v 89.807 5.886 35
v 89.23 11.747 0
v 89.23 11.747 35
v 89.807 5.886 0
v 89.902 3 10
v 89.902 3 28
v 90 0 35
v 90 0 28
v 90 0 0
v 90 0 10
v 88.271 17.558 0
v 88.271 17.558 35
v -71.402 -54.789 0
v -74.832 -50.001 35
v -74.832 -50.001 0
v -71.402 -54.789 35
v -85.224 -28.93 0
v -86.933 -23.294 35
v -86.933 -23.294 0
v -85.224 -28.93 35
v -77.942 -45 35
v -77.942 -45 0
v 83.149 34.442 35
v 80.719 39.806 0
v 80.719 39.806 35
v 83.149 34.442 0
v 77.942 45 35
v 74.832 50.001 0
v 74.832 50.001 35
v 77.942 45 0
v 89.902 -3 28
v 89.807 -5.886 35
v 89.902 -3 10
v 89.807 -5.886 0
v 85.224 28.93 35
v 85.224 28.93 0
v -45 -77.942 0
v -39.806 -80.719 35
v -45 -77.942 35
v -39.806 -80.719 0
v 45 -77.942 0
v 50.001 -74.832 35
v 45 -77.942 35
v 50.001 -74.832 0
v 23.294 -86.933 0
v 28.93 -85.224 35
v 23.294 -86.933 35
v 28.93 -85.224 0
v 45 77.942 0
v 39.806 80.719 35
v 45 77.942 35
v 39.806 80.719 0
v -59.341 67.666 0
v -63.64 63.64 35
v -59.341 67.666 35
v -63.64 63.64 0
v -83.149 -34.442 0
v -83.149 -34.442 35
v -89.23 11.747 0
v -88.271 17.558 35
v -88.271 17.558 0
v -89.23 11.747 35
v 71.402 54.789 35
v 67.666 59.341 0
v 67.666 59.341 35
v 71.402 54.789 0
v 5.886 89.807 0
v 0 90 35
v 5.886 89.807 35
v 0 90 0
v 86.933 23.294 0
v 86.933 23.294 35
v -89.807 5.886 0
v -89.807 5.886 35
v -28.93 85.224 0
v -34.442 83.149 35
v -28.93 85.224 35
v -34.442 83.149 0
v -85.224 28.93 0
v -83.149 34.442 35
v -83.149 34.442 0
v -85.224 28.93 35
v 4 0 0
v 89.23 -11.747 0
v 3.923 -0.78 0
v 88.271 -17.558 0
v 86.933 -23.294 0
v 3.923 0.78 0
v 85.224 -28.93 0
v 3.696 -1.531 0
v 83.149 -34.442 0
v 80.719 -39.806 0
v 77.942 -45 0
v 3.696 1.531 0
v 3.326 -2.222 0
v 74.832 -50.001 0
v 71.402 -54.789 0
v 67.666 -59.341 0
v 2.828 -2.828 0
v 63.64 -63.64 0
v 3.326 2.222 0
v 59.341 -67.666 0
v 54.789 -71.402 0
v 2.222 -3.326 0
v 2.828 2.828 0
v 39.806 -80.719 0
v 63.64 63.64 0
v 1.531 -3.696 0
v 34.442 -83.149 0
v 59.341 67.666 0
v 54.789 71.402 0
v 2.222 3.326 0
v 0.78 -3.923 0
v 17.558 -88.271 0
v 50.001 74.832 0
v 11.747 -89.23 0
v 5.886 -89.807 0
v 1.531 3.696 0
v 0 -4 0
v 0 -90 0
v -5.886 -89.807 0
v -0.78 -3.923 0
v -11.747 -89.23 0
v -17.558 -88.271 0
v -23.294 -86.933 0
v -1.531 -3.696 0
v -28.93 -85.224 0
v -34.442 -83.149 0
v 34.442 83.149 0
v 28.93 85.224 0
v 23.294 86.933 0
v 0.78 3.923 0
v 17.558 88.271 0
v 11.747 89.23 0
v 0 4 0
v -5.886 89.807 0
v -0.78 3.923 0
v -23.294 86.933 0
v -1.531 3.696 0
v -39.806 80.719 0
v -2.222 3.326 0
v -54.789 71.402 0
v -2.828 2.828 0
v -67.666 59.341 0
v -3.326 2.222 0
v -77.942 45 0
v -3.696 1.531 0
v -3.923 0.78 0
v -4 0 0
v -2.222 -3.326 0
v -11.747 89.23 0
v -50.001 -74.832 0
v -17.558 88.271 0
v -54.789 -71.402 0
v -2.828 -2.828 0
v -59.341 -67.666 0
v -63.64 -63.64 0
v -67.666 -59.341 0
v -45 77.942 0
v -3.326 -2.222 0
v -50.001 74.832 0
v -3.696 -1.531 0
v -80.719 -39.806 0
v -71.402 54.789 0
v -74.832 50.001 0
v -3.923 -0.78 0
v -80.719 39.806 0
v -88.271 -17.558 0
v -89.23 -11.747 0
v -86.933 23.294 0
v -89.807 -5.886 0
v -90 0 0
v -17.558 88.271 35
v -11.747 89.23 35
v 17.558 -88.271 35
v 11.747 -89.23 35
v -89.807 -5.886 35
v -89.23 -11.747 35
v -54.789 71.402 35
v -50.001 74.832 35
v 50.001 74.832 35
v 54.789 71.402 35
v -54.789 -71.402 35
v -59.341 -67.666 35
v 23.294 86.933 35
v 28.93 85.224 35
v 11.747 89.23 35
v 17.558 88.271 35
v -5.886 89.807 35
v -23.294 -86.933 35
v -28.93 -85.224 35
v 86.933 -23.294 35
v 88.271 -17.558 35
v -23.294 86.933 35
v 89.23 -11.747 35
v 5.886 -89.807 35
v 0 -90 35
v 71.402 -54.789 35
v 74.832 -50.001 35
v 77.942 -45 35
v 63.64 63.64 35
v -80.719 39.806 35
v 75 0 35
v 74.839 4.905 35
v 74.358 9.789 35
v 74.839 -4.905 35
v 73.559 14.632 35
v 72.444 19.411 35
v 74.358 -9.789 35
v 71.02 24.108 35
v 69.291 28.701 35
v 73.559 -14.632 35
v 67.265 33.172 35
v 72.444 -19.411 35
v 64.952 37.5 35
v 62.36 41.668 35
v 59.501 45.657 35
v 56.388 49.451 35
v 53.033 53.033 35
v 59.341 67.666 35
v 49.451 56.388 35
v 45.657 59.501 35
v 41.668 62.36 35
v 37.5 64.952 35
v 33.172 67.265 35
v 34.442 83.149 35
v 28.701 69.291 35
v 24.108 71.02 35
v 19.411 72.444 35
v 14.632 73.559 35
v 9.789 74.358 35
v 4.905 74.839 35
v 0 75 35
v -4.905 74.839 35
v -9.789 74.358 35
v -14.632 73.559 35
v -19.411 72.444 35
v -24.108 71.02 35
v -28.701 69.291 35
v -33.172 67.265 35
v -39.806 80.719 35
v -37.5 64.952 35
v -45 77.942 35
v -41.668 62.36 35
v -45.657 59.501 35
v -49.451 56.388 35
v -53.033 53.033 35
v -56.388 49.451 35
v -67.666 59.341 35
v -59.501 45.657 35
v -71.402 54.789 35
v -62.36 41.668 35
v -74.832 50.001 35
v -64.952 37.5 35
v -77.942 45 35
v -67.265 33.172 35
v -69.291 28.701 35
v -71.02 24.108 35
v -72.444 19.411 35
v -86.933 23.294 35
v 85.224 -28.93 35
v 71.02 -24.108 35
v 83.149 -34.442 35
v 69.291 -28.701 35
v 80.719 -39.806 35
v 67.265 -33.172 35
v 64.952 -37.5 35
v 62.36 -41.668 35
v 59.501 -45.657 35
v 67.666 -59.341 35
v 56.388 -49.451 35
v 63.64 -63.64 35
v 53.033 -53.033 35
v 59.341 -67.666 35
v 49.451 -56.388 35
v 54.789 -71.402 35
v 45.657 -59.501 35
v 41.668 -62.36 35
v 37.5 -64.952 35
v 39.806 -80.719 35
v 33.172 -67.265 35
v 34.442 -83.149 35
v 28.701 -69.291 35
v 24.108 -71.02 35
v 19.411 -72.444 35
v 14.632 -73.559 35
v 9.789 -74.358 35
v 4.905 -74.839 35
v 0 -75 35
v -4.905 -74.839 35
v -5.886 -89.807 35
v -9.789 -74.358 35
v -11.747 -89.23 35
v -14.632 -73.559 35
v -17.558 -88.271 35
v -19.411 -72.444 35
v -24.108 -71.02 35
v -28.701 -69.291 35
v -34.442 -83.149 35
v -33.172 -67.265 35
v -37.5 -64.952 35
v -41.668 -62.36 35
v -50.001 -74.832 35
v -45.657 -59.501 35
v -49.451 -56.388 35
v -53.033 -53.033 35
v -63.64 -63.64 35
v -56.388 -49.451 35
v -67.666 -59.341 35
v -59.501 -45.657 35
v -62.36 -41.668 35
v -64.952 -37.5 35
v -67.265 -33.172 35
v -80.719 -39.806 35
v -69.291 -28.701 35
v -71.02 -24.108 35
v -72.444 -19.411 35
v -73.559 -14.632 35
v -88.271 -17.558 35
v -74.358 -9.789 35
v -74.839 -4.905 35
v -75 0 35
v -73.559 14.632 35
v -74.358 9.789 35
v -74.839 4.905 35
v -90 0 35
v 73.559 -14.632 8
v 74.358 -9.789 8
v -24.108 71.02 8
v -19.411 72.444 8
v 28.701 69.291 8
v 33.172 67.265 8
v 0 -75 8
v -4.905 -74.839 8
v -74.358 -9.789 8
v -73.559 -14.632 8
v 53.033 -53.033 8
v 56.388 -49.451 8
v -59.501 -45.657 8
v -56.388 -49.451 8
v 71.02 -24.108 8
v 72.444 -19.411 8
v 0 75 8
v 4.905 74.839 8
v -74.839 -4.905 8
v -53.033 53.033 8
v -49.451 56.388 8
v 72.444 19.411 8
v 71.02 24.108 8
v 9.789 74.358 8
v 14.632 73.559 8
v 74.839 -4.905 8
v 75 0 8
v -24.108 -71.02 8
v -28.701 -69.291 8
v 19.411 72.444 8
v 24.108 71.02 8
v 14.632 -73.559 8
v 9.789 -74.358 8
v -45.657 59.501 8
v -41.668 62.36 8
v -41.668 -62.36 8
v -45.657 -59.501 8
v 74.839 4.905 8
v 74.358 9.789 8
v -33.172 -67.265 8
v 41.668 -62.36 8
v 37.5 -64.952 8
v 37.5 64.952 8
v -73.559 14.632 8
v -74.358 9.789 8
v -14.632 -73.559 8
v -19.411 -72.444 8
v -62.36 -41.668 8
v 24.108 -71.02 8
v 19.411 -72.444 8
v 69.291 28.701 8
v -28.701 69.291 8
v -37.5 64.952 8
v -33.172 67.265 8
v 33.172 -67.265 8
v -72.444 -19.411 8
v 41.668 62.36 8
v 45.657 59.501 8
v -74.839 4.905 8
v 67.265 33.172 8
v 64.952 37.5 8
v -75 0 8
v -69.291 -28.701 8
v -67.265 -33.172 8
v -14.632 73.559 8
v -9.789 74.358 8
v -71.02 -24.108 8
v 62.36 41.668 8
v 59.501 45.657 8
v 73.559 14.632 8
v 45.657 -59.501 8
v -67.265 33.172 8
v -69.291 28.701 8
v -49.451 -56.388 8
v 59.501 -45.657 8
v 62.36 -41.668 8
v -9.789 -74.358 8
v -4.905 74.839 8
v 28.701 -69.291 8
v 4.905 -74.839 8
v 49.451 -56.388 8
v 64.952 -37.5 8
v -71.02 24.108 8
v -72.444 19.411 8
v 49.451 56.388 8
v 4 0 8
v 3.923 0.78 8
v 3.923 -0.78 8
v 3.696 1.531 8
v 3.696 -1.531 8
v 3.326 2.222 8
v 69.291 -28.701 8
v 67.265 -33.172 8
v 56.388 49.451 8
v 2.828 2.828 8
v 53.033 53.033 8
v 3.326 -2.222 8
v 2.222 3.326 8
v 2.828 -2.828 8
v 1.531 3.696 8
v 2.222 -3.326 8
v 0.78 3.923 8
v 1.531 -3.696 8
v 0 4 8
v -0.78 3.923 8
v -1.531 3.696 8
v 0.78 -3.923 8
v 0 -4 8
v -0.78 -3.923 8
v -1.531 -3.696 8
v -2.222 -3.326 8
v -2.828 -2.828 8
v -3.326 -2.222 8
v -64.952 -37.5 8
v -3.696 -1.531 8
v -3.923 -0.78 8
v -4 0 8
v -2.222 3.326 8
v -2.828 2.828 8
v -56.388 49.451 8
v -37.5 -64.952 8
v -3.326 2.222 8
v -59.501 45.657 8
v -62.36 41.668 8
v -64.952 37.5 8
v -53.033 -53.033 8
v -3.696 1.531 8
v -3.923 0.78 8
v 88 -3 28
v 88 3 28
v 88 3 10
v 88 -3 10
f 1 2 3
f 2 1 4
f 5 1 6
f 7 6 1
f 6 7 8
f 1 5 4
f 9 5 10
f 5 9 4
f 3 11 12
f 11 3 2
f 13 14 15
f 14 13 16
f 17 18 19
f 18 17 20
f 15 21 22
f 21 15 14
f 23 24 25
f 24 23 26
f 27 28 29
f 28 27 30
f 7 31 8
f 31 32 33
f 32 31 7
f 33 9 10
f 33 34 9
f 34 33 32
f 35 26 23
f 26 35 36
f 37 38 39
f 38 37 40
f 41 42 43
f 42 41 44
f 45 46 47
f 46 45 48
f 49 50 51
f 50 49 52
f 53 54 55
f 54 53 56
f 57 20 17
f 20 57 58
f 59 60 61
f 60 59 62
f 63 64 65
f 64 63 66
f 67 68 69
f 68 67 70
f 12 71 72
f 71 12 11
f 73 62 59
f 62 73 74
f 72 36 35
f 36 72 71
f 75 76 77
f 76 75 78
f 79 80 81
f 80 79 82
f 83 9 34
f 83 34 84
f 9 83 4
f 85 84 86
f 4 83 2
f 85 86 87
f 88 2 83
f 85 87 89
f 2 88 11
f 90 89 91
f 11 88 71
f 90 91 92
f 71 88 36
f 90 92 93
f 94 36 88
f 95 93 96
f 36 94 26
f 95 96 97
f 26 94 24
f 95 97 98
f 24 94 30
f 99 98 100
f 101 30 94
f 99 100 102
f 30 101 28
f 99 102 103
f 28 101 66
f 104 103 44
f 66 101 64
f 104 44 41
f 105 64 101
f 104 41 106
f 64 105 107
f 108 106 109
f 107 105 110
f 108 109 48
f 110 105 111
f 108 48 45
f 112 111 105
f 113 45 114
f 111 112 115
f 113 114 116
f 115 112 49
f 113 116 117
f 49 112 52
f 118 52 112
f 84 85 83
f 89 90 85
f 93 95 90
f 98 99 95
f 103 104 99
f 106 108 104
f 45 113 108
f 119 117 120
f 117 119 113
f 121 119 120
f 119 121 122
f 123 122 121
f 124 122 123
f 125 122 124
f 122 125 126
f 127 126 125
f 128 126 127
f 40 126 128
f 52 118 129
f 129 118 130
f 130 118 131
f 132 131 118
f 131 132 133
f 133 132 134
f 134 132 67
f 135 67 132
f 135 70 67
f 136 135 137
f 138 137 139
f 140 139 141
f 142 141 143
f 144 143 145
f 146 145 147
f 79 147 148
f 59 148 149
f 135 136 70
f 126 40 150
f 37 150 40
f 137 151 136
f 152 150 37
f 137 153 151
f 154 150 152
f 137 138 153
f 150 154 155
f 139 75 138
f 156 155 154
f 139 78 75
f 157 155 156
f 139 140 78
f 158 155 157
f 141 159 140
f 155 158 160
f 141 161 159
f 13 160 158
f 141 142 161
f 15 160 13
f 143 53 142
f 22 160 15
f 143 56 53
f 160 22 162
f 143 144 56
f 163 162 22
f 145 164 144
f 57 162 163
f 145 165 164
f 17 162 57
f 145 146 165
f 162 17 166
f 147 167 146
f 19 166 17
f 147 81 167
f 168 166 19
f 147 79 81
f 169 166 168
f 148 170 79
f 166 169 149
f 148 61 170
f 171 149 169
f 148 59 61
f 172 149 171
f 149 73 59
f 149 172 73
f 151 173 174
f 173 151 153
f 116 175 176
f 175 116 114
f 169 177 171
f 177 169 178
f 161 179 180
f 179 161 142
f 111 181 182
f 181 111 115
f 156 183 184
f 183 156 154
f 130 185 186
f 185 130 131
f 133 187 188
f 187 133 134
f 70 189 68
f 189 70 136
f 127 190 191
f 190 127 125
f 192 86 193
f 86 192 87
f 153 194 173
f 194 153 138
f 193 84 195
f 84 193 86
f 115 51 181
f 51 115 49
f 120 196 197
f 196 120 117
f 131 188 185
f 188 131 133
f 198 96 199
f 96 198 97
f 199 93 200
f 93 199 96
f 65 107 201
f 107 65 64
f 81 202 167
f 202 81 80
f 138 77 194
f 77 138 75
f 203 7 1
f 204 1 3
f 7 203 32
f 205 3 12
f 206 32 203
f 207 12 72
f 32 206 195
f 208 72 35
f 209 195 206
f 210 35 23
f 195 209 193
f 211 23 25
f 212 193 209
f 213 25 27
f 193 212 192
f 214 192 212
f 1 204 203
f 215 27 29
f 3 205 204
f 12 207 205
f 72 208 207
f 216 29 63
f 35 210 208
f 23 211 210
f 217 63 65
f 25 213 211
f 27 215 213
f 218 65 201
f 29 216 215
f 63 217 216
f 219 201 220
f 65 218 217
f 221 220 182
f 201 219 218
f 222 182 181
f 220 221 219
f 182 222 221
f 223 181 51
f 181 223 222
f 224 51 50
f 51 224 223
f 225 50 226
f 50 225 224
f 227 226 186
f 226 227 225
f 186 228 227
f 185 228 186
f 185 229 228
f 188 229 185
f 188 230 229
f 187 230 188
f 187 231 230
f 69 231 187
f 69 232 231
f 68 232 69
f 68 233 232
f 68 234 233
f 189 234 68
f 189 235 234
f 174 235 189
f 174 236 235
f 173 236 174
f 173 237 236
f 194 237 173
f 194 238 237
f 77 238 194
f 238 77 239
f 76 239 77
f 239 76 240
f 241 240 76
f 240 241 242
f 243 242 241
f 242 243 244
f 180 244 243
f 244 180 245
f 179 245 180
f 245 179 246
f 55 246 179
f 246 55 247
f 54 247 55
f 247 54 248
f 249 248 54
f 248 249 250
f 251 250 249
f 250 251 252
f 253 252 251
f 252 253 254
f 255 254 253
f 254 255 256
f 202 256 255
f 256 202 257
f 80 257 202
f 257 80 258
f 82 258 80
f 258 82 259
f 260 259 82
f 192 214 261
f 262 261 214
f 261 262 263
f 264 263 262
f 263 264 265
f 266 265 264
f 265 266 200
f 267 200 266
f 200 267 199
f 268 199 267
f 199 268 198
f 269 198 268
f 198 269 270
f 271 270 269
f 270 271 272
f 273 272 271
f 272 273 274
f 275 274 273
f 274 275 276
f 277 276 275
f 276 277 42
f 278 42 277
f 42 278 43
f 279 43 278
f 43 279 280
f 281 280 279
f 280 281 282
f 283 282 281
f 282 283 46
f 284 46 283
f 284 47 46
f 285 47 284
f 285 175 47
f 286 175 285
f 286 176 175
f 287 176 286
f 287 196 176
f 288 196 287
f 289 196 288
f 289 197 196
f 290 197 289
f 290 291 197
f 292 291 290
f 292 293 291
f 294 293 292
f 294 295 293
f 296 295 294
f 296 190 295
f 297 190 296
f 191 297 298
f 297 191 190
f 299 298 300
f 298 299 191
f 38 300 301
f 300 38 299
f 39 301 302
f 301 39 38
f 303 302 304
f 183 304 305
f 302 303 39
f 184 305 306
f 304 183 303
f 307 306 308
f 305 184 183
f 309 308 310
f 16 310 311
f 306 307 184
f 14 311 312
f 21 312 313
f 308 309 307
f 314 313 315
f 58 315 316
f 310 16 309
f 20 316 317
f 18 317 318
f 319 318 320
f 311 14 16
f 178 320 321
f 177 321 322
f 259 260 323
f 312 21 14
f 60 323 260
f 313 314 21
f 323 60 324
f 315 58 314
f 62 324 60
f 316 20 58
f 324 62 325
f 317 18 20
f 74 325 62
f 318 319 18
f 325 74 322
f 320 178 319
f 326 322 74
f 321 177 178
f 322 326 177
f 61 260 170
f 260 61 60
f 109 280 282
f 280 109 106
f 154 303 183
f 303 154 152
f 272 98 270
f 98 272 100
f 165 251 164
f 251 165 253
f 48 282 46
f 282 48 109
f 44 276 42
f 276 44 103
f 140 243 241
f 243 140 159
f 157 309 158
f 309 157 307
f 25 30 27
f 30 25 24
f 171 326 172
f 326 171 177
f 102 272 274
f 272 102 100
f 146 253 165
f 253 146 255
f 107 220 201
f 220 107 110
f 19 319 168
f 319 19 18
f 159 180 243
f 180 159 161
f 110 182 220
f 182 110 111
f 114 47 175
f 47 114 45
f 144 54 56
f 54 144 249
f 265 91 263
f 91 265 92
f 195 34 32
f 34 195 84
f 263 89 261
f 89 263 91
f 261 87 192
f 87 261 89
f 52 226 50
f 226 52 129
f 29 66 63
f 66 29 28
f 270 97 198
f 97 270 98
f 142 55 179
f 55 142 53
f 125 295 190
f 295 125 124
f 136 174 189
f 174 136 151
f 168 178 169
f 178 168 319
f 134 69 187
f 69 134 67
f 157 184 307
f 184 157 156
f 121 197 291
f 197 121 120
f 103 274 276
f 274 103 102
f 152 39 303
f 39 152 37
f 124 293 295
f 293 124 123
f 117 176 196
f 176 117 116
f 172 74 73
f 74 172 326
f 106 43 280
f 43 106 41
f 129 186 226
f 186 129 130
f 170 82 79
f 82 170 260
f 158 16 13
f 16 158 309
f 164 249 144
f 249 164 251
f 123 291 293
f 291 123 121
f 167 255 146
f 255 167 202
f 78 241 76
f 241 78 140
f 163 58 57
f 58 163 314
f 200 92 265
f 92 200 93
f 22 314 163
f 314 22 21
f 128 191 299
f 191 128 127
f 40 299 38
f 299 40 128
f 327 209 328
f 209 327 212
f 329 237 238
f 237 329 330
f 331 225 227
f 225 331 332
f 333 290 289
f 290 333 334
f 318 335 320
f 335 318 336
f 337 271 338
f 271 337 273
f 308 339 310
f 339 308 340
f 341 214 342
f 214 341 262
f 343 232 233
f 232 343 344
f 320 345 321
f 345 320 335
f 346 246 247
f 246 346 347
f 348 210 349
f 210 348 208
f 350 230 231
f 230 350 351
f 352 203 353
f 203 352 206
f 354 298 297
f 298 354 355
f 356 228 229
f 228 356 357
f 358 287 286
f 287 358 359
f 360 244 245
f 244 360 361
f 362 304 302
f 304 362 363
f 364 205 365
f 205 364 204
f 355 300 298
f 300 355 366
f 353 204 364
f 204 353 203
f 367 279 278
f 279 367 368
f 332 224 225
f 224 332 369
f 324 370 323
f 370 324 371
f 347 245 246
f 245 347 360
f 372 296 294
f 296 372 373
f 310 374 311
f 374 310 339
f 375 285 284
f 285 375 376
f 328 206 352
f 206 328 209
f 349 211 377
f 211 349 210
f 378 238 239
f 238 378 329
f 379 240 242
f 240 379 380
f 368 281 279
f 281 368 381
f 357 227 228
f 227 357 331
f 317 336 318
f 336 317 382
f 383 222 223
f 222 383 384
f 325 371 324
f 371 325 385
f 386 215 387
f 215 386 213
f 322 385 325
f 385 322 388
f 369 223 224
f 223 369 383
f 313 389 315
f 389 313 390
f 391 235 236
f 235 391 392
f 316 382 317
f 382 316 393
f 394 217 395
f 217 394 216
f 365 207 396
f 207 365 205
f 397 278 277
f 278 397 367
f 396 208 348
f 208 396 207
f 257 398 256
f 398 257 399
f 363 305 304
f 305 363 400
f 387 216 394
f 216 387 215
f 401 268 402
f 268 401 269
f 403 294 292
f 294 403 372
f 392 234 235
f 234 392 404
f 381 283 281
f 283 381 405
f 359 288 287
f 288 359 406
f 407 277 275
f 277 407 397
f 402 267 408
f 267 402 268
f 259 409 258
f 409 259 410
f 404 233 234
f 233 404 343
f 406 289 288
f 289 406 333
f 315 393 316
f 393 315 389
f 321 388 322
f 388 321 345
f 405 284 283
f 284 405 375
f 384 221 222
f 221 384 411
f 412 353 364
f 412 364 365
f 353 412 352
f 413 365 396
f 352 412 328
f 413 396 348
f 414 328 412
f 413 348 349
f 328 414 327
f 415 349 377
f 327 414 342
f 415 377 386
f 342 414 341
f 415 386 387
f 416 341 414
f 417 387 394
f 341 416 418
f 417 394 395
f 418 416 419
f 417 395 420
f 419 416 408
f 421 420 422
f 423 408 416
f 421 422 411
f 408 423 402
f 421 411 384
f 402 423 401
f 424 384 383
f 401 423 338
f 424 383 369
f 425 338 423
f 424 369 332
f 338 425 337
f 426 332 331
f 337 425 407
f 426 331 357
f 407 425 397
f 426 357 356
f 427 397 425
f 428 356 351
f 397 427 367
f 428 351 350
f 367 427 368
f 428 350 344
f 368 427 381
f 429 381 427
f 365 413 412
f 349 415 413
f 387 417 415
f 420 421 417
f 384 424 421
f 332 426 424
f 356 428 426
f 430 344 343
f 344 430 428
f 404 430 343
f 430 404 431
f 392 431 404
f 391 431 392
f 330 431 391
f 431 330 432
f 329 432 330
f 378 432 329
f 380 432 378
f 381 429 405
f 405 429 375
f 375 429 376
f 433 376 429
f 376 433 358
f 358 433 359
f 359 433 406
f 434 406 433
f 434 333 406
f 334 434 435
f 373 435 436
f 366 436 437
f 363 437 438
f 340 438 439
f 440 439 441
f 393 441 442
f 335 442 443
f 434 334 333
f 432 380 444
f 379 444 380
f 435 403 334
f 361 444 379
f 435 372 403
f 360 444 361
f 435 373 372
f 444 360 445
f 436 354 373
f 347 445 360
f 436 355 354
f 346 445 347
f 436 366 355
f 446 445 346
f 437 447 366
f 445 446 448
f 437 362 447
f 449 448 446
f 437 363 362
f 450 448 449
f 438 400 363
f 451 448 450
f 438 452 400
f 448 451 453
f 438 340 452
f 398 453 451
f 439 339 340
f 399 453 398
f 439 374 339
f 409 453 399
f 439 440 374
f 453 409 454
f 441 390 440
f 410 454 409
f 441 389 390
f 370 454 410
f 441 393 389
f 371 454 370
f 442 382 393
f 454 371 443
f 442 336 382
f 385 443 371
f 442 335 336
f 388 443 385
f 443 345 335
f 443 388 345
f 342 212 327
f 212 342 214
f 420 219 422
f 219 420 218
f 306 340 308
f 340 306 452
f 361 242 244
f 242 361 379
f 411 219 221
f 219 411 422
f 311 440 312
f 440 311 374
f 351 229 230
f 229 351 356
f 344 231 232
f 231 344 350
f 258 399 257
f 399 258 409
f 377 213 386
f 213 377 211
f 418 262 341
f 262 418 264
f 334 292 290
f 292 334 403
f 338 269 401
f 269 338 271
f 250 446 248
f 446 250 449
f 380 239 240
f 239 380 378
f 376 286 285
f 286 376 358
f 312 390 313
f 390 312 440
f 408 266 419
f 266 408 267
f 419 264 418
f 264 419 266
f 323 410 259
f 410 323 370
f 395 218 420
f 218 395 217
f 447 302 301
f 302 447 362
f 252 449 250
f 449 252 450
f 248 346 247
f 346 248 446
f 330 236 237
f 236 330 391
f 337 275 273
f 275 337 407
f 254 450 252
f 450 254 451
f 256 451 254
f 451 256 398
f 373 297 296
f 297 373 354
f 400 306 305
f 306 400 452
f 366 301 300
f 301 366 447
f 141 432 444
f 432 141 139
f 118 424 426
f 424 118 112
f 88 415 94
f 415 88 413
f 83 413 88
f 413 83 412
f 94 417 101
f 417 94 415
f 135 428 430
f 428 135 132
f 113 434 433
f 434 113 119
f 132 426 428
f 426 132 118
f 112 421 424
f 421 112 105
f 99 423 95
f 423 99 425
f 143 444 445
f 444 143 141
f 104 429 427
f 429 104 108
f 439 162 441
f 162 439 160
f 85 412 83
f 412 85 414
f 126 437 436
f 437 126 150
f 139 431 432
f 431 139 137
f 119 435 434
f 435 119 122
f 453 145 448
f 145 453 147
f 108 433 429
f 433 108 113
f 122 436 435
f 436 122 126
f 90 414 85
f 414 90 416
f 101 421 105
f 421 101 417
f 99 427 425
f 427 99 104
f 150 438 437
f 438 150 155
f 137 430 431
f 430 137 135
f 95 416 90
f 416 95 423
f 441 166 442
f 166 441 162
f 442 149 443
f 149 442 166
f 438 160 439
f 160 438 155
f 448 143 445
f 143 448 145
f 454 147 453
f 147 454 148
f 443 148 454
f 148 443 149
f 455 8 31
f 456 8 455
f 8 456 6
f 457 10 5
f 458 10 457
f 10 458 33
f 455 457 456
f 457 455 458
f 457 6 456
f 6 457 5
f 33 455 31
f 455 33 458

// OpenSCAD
// Parametric grass cutting deck housing for the garden-automation robot.
// Holds a brushless blade motor and a safety guard ring.
// Issue #76 task: Scegliere sensori e attuatori.
// Print in PETG or ASA, 100% infill; the blade is NOT printed (use a hardened steel mower blade).

// Parameters (mm)
deck_outer_dia = 180;     // outer diameter of the deck ring
deck_inner_dia = 150;     // inner diameter (blade sweep clearance)
deck_height = 35;        // deck wall height
blade_shaft_dia = 8;     // motor shaft diameter
motor_mount_dia = 42;    // brushless motor mount bolt circle
mount_bolt_dia = 4.2;   // M4 mounting bolts (3x at 120 deg)
guard_slot_w = 6;        // width of grass discharge slot
guard_slot_h = 18;       // height of grass discharge slot

$fn = 96;

module cutting_deck() {
  difference() {
    // outer deck ring
    cylinder(h = deck_height, d = deck_outer_dia);
    // blade clearance bore
    translate([0, 0, 8])
      cylinder(h = deck_height, d = deck_inner_dia);
    // central motor shaft hole
    cylinder(h = deck_height, d = blade_shaft_dia, $fn = 32);
    // motor mount bolt holes (3 bolts at 120 deg)
    for (a = [0, 120, 240]) {
      rotate([0, 0, a])
        translate([motor_mount_dia / 2, 0, deck_height - 10])
          cylinder(h = 12, d = mount_bolt_dia, $fn = 24);
    }
    // grass discharge slot
    translate([deck_outer_dia / 2 - 2, -guard_slot_w / 2, 10])
      cube([10, guard_slot_w, guard_slot_h]);
  }
}

cutting_deck();
// Mount with the discharge slot pointing away from the chassis drive path.
